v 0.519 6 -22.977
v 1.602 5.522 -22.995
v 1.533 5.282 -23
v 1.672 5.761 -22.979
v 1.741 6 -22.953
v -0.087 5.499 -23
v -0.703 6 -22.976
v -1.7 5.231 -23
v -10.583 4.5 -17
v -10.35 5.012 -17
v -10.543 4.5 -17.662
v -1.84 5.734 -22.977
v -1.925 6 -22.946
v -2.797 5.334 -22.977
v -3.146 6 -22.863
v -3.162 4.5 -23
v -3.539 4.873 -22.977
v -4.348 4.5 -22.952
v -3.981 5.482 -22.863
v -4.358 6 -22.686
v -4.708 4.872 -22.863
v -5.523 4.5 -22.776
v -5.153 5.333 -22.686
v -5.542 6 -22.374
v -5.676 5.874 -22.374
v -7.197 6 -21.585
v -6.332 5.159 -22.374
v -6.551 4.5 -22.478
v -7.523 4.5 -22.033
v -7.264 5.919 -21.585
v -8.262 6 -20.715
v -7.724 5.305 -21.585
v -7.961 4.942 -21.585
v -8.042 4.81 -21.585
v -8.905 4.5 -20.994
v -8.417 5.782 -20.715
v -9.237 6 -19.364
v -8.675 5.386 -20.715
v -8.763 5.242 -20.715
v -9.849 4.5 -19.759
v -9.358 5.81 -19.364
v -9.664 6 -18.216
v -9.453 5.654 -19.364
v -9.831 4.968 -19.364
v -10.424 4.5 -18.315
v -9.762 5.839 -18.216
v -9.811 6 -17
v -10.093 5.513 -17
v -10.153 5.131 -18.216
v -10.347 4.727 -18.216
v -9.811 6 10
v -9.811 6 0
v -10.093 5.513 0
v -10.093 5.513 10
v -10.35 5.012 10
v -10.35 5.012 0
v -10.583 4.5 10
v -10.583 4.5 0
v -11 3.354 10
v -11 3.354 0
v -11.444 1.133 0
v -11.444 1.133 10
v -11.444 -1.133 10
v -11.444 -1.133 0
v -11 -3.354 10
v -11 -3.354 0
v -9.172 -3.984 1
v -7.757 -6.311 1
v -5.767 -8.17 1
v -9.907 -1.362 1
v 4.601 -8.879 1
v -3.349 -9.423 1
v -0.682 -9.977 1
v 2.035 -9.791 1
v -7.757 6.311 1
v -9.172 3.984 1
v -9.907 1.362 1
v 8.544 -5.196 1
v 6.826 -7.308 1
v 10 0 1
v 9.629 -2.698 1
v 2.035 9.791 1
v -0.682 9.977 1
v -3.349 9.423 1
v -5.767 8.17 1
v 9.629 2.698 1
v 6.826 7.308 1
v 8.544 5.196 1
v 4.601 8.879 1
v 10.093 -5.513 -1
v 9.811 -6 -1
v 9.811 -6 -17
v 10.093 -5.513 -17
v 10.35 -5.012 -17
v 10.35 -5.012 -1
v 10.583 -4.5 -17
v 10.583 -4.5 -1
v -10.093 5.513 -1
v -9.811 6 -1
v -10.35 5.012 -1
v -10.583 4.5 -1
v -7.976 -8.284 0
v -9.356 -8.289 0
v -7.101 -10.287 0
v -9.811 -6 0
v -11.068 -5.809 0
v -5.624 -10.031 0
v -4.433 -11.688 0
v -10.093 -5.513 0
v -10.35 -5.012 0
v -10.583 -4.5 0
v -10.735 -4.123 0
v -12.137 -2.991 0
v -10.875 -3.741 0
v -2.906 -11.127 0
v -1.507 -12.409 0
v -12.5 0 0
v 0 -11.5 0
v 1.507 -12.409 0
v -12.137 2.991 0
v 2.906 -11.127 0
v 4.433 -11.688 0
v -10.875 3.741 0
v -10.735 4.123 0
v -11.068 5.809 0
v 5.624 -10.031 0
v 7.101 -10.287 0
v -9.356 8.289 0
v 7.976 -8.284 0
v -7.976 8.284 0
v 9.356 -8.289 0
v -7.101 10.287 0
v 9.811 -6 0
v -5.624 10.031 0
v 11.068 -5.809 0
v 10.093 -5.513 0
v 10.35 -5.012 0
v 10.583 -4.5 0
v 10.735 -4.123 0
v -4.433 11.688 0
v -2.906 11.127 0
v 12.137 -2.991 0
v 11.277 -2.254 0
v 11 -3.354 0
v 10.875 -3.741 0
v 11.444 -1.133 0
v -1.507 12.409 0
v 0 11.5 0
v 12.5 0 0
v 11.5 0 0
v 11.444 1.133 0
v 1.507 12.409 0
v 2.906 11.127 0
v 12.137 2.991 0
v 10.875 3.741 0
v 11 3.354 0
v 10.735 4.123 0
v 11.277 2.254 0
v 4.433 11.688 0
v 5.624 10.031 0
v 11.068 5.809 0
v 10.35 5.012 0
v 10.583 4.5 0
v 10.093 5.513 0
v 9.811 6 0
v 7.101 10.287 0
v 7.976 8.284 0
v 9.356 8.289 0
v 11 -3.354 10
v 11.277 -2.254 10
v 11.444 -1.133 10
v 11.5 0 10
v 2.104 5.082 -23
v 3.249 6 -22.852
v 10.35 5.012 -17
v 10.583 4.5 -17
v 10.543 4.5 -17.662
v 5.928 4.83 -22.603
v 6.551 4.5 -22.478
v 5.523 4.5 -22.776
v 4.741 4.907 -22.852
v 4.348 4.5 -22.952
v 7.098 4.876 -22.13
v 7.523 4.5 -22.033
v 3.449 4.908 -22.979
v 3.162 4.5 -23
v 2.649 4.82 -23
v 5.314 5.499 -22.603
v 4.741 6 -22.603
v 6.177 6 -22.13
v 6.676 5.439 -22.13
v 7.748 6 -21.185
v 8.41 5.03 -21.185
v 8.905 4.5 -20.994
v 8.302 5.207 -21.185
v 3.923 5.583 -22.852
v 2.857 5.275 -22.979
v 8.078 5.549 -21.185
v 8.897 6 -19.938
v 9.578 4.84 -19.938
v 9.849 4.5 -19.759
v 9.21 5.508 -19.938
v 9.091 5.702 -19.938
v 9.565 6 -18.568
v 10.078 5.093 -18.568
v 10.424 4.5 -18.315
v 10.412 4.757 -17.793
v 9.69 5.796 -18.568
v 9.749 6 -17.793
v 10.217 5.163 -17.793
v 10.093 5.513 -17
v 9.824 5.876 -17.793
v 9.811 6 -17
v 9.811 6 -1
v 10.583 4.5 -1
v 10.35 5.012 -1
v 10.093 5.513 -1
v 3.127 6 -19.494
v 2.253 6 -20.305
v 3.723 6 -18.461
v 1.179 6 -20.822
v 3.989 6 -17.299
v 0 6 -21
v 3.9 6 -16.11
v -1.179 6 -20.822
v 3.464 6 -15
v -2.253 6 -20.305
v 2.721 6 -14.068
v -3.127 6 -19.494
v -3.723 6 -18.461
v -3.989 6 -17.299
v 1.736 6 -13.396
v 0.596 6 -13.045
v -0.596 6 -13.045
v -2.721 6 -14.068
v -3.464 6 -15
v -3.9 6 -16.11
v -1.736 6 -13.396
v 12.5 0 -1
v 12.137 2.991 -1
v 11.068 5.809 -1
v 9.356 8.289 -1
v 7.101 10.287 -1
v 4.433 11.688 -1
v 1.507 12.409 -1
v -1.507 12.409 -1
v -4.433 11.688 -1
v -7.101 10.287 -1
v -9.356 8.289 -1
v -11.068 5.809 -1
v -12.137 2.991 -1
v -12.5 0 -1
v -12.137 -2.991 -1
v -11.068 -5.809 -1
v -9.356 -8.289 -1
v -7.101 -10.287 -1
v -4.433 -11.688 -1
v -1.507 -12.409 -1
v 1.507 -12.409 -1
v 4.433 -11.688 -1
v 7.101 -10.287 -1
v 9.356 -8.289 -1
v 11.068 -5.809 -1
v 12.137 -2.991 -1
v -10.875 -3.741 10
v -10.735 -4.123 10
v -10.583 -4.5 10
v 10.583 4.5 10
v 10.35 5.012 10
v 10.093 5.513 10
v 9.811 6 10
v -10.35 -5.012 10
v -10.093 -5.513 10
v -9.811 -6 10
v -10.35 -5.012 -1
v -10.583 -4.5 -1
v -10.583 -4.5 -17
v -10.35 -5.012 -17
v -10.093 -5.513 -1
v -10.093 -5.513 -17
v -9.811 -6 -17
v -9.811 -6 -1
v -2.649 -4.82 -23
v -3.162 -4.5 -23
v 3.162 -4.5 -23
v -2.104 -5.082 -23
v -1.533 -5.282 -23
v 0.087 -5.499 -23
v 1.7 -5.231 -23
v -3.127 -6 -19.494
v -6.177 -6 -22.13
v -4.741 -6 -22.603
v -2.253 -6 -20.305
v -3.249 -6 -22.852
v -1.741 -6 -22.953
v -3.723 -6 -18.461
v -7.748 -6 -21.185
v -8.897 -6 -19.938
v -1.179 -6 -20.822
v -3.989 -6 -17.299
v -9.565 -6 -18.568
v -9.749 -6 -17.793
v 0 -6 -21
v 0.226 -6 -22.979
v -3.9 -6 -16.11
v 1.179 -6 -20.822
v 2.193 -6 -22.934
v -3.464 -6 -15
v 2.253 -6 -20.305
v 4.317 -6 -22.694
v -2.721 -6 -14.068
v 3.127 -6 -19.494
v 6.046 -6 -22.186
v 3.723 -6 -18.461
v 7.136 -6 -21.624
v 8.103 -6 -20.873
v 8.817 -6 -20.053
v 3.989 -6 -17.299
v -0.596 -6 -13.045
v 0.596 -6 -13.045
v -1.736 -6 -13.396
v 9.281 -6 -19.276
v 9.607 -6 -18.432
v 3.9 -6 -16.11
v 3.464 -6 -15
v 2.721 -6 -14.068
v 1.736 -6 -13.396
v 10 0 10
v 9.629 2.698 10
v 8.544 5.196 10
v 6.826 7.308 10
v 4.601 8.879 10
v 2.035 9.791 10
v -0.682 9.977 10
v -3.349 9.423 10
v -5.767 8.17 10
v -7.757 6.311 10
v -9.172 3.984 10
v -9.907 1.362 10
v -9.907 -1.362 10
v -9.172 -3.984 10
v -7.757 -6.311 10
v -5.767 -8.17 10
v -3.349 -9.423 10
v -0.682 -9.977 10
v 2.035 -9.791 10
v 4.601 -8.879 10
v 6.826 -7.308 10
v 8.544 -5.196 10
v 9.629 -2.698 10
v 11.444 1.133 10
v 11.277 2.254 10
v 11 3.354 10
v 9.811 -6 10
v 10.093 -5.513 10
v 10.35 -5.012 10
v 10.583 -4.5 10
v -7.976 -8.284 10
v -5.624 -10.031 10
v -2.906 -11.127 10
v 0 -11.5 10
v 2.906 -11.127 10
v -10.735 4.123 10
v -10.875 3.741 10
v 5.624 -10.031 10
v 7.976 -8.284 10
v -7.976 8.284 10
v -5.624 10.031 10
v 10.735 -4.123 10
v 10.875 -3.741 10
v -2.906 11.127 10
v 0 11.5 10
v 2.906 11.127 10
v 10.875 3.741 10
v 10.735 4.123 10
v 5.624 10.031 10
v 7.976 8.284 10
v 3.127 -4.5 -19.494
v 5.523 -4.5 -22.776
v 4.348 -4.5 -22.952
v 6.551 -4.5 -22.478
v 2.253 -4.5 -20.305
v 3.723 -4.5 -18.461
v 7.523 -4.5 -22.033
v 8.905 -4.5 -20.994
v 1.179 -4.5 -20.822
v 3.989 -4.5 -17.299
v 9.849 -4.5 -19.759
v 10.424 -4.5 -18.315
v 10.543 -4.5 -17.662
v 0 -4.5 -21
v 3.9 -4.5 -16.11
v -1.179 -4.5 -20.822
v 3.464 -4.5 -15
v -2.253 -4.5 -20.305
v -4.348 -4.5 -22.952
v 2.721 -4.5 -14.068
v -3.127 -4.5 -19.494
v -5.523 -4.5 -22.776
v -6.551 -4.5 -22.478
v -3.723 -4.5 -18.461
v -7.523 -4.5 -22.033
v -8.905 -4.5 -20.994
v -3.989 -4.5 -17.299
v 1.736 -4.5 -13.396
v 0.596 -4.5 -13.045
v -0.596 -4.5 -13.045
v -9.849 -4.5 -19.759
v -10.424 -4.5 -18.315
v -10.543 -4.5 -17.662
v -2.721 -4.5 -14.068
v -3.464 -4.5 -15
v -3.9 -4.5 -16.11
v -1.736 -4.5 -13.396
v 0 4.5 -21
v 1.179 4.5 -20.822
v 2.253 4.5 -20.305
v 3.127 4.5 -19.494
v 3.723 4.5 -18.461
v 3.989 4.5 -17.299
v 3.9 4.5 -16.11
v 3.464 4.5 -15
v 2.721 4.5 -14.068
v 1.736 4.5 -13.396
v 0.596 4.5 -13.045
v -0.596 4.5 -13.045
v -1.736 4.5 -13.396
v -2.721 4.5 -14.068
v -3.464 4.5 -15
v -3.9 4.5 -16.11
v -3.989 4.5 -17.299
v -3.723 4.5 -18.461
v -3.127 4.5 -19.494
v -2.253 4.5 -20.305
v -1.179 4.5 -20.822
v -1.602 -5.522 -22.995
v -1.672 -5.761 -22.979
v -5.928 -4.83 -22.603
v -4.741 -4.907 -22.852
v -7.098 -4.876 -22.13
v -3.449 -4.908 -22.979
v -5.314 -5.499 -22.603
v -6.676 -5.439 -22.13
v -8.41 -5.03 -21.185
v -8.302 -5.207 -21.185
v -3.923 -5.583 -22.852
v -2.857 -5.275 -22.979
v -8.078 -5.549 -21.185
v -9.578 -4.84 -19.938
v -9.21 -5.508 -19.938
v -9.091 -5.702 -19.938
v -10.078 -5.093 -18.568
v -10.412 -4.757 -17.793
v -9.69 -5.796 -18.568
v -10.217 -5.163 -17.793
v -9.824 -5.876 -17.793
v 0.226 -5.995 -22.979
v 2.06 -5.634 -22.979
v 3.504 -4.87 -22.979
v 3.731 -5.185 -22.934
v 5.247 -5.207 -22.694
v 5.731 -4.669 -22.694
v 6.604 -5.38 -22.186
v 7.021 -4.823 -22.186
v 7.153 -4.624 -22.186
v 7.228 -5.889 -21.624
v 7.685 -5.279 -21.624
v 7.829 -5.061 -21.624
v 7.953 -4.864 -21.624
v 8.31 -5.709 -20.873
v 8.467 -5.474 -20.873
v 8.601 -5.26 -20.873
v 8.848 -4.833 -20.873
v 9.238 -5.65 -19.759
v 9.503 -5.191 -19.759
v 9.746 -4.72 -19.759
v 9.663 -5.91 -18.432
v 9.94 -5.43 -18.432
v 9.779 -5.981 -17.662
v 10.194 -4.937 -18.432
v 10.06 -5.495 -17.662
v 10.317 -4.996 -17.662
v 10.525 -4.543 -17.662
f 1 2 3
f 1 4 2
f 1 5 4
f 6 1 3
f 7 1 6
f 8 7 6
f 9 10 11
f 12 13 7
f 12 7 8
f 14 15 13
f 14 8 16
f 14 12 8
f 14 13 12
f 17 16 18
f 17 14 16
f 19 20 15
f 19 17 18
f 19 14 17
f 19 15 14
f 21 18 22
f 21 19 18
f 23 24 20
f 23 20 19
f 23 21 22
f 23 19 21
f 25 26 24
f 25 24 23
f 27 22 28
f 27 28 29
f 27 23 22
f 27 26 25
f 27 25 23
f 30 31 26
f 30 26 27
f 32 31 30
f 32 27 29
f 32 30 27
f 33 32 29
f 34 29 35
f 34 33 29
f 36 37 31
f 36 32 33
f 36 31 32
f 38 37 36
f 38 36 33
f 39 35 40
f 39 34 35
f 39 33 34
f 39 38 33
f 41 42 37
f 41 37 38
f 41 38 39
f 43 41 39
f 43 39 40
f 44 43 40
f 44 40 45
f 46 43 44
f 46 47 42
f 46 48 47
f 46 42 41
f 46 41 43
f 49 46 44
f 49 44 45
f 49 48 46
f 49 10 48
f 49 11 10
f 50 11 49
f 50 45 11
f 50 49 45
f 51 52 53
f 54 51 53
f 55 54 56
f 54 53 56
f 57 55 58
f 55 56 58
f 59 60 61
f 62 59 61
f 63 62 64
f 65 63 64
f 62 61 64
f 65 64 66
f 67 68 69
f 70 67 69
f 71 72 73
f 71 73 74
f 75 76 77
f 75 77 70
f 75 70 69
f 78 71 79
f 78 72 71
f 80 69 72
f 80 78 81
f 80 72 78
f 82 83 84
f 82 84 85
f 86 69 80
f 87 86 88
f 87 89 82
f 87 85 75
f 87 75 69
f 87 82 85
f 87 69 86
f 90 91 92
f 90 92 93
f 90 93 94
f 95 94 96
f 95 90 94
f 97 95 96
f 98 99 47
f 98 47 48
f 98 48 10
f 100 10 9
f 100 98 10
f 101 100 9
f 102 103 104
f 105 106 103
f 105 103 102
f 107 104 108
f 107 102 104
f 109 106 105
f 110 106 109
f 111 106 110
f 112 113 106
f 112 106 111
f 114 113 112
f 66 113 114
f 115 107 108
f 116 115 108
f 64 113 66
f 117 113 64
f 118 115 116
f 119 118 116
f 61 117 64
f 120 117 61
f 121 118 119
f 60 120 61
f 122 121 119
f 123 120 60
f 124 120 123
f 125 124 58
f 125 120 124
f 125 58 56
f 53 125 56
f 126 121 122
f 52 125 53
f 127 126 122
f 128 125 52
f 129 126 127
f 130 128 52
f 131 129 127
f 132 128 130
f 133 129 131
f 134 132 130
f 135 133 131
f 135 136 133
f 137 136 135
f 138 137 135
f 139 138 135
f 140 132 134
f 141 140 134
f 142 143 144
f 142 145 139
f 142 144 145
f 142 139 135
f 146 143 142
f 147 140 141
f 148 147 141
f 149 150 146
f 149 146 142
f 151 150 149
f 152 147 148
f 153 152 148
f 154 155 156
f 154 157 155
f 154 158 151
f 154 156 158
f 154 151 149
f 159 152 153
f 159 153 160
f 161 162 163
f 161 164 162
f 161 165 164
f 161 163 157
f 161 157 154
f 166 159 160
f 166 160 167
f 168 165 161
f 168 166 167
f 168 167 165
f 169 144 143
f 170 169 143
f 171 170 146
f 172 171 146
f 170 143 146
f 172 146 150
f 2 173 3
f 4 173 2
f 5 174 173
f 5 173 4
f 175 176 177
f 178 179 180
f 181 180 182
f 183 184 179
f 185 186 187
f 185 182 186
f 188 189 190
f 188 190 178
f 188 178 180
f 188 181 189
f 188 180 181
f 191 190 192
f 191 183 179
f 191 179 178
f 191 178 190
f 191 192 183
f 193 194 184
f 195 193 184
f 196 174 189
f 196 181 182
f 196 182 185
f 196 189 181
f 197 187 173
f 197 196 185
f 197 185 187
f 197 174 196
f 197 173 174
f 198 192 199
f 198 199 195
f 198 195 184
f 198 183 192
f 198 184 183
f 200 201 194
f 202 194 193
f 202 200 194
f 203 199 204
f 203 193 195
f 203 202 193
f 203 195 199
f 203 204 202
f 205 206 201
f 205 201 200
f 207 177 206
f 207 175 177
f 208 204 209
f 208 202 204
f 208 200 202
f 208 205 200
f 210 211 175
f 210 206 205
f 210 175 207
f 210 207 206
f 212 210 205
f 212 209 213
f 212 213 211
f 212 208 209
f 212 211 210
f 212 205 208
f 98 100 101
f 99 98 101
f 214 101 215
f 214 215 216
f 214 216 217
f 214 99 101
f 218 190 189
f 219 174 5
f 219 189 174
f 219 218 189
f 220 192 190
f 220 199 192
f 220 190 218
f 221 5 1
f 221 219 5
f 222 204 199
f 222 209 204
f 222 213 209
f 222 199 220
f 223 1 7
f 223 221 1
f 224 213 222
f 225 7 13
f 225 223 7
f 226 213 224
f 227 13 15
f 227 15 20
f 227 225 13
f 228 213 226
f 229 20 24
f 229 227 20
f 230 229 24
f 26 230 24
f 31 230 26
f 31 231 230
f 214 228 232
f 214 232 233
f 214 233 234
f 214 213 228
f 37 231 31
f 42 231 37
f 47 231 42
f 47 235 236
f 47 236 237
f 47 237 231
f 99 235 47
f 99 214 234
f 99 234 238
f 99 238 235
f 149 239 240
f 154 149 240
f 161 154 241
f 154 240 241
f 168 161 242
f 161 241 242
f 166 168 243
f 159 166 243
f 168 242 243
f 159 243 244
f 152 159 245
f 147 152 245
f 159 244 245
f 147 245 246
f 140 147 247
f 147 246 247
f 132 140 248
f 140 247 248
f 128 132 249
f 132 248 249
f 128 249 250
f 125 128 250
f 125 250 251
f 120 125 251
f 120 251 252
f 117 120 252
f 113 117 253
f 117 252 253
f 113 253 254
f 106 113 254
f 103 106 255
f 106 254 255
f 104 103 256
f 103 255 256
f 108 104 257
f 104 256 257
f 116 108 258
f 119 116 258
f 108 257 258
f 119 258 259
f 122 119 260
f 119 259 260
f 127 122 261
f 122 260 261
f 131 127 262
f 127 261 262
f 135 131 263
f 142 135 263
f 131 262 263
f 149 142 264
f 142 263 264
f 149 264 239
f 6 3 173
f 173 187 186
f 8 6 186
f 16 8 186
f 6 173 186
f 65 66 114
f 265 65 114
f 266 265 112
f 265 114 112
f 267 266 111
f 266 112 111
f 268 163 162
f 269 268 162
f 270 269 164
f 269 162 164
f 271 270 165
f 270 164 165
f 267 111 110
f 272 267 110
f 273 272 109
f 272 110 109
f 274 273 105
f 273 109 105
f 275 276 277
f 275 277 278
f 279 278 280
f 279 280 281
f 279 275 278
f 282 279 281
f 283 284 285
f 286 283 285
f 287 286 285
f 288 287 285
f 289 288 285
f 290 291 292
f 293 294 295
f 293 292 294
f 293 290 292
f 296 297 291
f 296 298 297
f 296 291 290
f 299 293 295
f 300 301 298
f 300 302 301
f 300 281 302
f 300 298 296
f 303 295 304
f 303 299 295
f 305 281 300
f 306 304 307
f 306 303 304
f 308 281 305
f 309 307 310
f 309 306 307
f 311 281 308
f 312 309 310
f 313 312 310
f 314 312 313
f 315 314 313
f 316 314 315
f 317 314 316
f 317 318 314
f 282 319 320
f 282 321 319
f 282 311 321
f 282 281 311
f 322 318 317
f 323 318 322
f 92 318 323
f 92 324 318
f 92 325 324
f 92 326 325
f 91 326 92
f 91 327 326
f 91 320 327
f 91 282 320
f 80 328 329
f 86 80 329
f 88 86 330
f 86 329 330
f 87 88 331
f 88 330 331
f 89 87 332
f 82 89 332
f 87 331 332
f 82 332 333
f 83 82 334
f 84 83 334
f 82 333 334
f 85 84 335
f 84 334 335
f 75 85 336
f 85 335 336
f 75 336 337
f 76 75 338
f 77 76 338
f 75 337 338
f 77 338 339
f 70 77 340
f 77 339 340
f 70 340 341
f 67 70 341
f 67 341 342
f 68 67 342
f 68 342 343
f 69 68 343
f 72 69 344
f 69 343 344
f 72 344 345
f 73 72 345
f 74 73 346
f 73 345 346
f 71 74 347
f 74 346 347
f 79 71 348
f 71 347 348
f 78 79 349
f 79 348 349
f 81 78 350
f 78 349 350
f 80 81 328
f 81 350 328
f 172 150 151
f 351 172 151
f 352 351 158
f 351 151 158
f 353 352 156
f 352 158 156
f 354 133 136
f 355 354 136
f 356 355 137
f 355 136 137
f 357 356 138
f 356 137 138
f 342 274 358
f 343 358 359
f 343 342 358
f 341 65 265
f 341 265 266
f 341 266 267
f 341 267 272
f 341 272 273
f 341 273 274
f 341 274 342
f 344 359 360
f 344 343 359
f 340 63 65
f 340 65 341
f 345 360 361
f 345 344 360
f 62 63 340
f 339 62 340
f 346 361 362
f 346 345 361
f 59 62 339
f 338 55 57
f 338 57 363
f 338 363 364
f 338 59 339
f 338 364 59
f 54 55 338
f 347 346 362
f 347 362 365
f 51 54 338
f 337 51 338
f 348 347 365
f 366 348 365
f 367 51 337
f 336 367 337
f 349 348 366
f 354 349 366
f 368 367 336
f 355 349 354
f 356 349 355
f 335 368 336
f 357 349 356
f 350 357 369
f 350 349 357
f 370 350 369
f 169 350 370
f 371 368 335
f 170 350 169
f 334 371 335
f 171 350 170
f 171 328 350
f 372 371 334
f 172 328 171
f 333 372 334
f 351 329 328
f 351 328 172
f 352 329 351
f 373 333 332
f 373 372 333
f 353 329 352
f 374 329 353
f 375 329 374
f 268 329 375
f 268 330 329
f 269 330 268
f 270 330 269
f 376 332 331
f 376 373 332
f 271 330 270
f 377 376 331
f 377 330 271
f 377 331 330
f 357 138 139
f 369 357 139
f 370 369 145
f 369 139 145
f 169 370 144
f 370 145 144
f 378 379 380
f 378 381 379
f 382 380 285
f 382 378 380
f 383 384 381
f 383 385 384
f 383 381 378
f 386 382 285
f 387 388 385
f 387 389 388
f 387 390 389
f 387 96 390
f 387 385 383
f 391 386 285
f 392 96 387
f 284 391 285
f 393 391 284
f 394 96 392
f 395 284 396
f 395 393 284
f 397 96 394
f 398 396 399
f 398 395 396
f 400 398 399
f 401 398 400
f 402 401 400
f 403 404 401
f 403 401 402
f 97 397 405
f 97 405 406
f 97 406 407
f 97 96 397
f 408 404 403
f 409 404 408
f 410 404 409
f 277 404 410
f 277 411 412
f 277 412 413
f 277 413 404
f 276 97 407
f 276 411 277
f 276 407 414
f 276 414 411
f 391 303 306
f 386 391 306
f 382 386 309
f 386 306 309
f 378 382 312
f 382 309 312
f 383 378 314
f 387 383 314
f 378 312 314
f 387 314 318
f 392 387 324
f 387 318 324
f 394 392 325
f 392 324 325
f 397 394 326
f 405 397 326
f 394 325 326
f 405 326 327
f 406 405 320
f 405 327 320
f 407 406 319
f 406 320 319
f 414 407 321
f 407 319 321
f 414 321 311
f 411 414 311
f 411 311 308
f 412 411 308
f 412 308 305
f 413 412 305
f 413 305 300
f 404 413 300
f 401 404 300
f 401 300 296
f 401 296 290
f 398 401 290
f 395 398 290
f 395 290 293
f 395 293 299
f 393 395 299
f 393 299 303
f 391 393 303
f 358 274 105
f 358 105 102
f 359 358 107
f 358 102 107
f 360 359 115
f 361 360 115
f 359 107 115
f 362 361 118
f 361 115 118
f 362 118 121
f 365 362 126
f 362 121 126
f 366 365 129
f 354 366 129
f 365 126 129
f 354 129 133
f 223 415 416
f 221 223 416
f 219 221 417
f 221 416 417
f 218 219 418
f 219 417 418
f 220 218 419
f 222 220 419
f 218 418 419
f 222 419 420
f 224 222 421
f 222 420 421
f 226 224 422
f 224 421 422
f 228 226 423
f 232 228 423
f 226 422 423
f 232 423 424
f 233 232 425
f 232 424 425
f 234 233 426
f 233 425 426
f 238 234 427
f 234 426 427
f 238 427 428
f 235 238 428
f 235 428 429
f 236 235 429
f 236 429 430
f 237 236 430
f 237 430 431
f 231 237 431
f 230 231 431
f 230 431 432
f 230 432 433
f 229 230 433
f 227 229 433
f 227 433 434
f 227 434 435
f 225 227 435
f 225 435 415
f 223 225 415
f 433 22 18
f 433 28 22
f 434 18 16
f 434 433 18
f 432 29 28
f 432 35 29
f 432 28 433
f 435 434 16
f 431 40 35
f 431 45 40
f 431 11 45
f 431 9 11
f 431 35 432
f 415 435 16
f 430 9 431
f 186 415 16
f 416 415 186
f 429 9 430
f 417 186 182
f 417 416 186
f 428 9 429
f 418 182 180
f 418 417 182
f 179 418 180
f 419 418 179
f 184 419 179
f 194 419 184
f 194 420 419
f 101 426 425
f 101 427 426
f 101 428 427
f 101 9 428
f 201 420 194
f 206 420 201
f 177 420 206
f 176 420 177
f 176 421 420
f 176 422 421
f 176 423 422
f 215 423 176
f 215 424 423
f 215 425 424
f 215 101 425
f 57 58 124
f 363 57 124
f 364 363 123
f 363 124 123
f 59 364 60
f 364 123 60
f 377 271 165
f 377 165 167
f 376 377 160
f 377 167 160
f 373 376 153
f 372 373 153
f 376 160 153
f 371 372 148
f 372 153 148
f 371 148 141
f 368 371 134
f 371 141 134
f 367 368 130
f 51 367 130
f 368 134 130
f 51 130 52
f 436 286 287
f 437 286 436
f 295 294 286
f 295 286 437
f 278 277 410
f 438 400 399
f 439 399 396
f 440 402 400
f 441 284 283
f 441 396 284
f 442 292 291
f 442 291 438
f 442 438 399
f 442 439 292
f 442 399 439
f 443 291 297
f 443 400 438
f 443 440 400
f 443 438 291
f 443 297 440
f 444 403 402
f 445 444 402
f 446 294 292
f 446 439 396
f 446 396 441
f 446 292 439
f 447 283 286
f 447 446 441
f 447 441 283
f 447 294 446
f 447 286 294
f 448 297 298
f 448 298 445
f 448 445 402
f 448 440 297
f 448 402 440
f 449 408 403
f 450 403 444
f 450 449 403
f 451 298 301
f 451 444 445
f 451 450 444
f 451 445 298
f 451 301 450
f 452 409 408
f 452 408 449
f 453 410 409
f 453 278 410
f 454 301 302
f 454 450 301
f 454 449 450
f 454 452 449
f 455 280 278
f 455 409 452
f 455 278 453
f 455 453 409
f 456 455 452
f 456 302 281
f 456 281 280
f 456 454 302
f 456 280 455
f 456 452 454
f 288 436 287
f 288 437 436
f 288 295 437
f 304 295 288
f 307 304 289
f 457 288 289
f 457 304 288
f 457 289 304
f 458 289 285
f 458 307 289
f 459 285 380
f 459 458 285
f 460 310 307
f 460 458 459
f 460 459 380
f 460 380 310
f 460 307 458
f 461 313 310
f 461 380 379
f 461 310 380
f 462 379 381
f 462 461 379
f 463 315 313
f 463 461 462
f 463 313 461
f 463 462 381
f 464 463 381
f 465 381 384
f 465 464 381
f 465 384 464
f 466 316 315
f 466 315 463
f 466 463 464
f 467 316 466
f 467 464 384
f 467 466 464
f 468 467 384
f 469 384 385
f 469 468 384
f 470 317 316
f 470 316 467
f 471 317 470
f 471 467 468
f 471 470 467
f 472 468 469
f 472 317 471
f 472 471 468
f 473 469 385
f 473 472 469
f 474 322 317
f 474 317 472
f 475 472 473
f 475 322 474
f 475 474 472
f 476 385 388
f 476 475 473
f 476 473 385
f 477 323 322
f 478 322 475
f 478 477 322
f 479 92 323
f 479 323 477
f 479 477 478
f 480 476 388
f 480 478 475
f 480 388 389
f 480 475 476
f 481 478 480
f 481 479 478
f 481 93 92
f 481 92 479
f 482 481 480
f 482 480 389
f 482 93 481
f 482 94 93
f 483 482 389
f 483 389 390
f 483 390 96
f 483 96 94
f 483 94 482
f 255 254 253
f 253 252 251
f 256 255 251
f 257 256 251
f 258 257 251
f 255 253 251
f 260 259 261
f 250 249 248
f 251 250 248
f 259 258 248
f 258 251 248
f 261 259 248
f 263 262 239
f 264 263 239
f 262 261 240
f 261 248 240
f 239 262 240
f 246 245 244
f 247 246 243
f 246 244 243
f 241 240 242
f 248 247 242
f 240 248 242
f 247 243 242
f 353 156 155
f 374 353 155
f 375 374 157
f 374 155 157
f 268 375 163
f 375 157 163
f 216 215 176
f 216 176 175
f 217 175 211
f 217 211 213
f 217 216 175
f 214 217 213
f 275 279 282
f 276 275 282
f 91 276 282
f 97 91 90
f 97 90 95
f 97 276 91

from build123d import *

# Parameters (mm, degrees)
BOSS_EXTRUDE1_DEPTH   = 10
BOSS_EXTRUDE2_START   = -1
SKETCH1_3_R           = 12.5
BOSS_EXTRUDE2_DEPTH   = 1
BOSS_EXTRUDE3_START   = -1
BOSS_EXTRUDE3_DEPTH   = 22
BOSS_EXTRUDE3_2_DEPTH = 22
SKETCH2_R             = 4
CUT_EXTRUDE1_DEPTH    = 33.05464085
FILLET1_R             = 6
FILLET4_R             = 6
SKETCH3_R             = 10
CUT_EXTRUDE2_DEPTH    = 9


with BuildPart() as part:
    # Sketch1 → Boss-Extrude1 (new body)
    with BuildSketch(Plane.XY):
        with BuildLine():
            ThreePointArc((9.810708435, 6), (0, 11.5), (-9.810708435, 6))
            Line((-9.810708435, 6), (9.810708435, 6))
        make_face()
        with BuildLine():
            Line((9.810708435, 6), (-9.810708435, 6))
            ThreePointArc((-9.810708435, 6), (-10.224401665, 5.264181854), (-10.583005244, 4.5))
            Line((-10.583005244, 4.5), (10.583005244, 4.5))
            ThreePointArc((10.583005244, 4.5), (10.224401665, 5.264181854), (9.810708435, 6))
        make_face()
        with BuildLine():
            Line((10.583005244, 4.5), (-10.583005244, 4.5))
            ThreePointArc((-10.583005244, 4.5), (-10.806701598, 3.932581923), (-11, 3.354101966))
            Line((-11, 3.354101966), (-11, -3.354101966))
            ThreePointArc((-11, -3.354101966), (-10.806701598, -3.932581923), (-10.583005244, -4.5))
            Line((-10.583005244, -4.5), (10.583005244, -4.5))
            ThreePointArc((10.583005244, -4.5), (10.806701598, -3.932581923), (11, -3.354101966))
            Line((11, -3.354101966), (11, 3.354101966))
            ThreePointArc((11, 3.354101966), (10.806701598, 3.932581923), (10.583005244, 4.5))
        make_face()
        with BuildLine():
            ThreePointArc((11.5, 0), (11.374313166, 1.695582496), (11, 3.354101966))
            Line((11, 3.354101966), (11, -3.354101966))
            ThreePointArc((11, -3.354101966), (11.374313166, -1.695582496), (11.5, 0))
        make_face()
        with BuildLine():
            Line((9.810708435, -6), (-9.810708435, -6))
            ThreePointArc((-9.810708435, -6), (0, -11.5), (9.810708435, -6))
        make_face()
        with BuildLine():
            Line((10.583005244, -4.5), (-10.583005244, -4.5))
            ThreePointArc((-10.583005244, -4.5), (-10.224401665, -5.264181854), (-9.810708435, -6))
            Line((-9.810708435, -6), (9.810708435, -6))
            ThreePointArc((9.810708435, -6), (10.224401665, -5.264181854), (10.583005244, -4.5))
        make_face()
        with BuildLine():
            Line((-11, -3.354101966), (-11, 3.354101966))
            ThreePointArc((-11, 3.354101966), (-11.5, 0), (-11, -3.354101966))
        make_face()
    extrude(amount=BOSS_EXTRUDE1_DEPTH)

    # Sketch1<3> → Boss-Extrude2 (add)
    # profile 1 of 8: a face of its own
    with BuildSketch(Plane.XY.offset(BOSS_EXTRUDE2_START)):
        Circle(SKETCH1_3_R)
        with BuildLine():
            ThreePointArc((-10.583005244, 4.5), (-10.224401665, 5.264181854), (-9.810708435, 6))
            ThreePointArc((-9.810708435, 6), (0, 11.5), (9.810708435, 6))
            ThreePointArc((9.810708435, 6), (10.224401665, 5.264181854), (10.583005244, 4.5))
            ThreePointArc((10.583005244, 4.5), (10.806701598, 3.932581923), (11, 3.354101966))
            ThreePointArc((11, 3.354101966), (11.374313166, 1.695582496), (11.5, 0))
            ThreePointArc((11.5, 0), (11.374313166, -1.695582496), (11, -3.354101966))
            ThreePointArc((11, -3.354101966), (10.806701598, -3.932581923), (10.583005244, -4.5))
            ThreePointArc((10.583005244, -4.5), (10.224401665, -5.264181854), (9.810708435, -6))
            ThreePointArc((9.810708435, -6), (0, -11.5), (-9.810708435, -6))
            ThreePointArc((-9.810708435, -6), (-10.224401665, -5.264181854), (-10.583005244, -4.5))
            ThreePointArc((-10.583005244, -4.5), (-10.806701598, -3.932581923), (-11, -3.354101966))
            ThreePointArc((-11, -3.354101966), (-11.5, 0), (-11, 3.354101966))
            ThreePointArc((-11, 3.354101966), (-10.806701598, 3.932581923), (-10.583005244, 4.5))
        make_face(mode=Mode.SUBTRACT)
    # profile 2 of 8: a face of its own
    with BuildSketch(Plane.XY.offset(BOSS_EXTRUDE2_START)):
        with BuildLine():
            Line((-11, -3.354101966), (-11, 3.354101966))
            ThreePointArc((-11, 3.354101966), (-11.5, 0), (-11, -3.354101966))
        make_face()
    # profile 3 of 8: a face of its own
    with BuildSketch(Plane.XY.offset(BOSS_EXTRUDE2_START)):
        with BuildLine():
            ThreePointArc((9.810708435, 6), (0, 11.5), (-9.810708435, 6))
            Line((-9.810708435, 6), (9.810708435, 6))
        make_face()
    # profile 4 of 8: a face of its own
    with BuildSketch(Plane.XY.offset(BOSS_EXTRUDE2_START)):
        with BuildLine():
            Line((9.810708435, 6), (-9.810708435, 6))
            ThreePointArc((-9.810708435, 6), (-10.224401665, 5.264181854), (-10.583005244, 4.5))
            Line((-10.583005244, 4.5), (10.583005244, 4.5))
            ThreePointArc((10.583005244, 4.5), (10.224401665, 5.264181854), (9.810708435, 6))
        make_face()
    # profile 5 of 8: a face of its own
    with BuildSketch(Plane.XY.offset(BOSS_EXTRUDE2_START)):
        with BuildLine():
            ThreePointArc((11.5, 0), (11.374313166, 1.695582496), (11, 3.354101966))
            Line((11, 3.354101966), (11, -3.354101966))
            ThreePointArc((11, -3.354101966), (11.374313166, -1.695582496), (11.5, 0))
        make_face()
    # profile 6 of 8: a face of its own
    with BuildSketch(Plane.XY.offset(BOSS_EXTRUDE2_START)):
        with BuildLine():
            Line((10.583005244, 4.5), (-10.583005244, 4.5))
            ThreePointArc((-10.583005244, 4.5), (-10.806701598, 3.932581923), (-11, 3.354101966))
            Line((-11, 3.354101966), (-11, -3.354101966))
            ThreePointArc((-11, -3.354101966), (-10.806701598, -3.932581923), (-10.583005244, -4.5))
            Line((-10.583005244, -4.5), (10.583005244, -4.5))
            ThreePointArc((10.583005244, -4.5), (10.806701598, -3.932581923), (11, -3.354101966))
            Line((11, -3.354101966), (11, 3.354101966))
            ThreePointArc((11, 3.354101966), (10.806701598, 3.932581923), (10.583005244, 4.5))
        make_face()
    # profile 7 of 8: a face of its own
    with BuildSketch(Plane.XY.offset(BOSS_EXTRUDE2_START)):
        with BuildLine():
            Line((10.583005244, -4.5), (-10.583005244, -4.5))
            ThreePointArc((-10.583005244, -4.5), (-10.224401665, -5.264181854), (-9.810708435, -6))
            Line((-9.810708435, -6), (9.810708435, -6))
            ThreePointArc((9.810708435, -6), (10.224401665, -5.264181854), (10.583005244, -4.5))
        make_face()
    # profile 8 of 8: a face of its own
    with BuildSketch(Plane.XY.offset(BOSS_EXTRUDE2_START)):
        with BuildLine():
            Line((9.810708435, -6), (-9.810708435, -6))
            ThreePointArc((-9.810708435, -6), (0, -11.5), (9.810708435, -6))
        make_face()
    extrude(amount=BOSS_EXTRUDE2_DEPTH)

    # Sketch3 → Cut-Extrude2 (cut)
    with BuildSketch(Plane.XY.offset(10)):
        Circle(SKETCH3_R)
    extrude(amount=-CUT_EXTRUDE2_DEPTH, mode=Mode.SUBTRACT)


with BuildPart() as body_2:
    # Sketch1<5> → Boss-Extrude3 (new body)
    with BuildSketch(Plane.XY.offset(BOSS_EXTRUDE3_START)):
        with BuildLine():
            Line((9.810708435, 6), (-9.810708435, 6))
            ThreePointArc((-9.810708435, 6), (-10.224401665, 5.264181854), (-10.583005244, 4.5))
            Line((-10.583005244, 4.5), (10.583005244, 4.5))
            ThreePointArc((10.583005244, 4.5), (10.224401665, 5.264181854), (9.810708435, 6))
        make_face()
    extrude(amount=-BOSS_EXTRUDE3_DEPTH)


with BuildPart() as body_3:
    # Sketch1<5> → Boss-Extrude3 2 (new body)
    with BuildSketch(Plane.XY.offset(BOSS_EXTRUDE3_START)):
        with BuildLine():
            Line((10.583005244, -4.5), (-10.583005244, -4.5))
            ThreePointArc((-10.583005244, -4.5), (-10.224401665, -5.264181854), (-9.810708435, -6))
            Line((-9.810708435, -6), (9.810708435, -6))
            ThreePointArc((9.810708435, -6), (10.224401665, -5.264181854), (10.583005244, -4.5))
        make_face()
    extrude(amount=-BOSS_EXTRUDE3_2_DEPTH)


with BuildPart() as cut_extrude1_tool:
    # Sketch2 → Cut-Extrude1 (new, through all)
    with BuildSketch(Plane.XZ.offset(6)):
        with Locations(Location((0, -17, 0), (0, 0, 270))):
            Circle(SKETCH2_R)
    extrude(amount=-CUT_EXTRUDE1_DEPTH)


with BuildPart() as body_2_1:
    add(body_2.part)

    # Cut-Extrude1: cut by cut_extrude1_tool
    add(cut_extrude1_tool.part, mode=Mode.SUBTRACT)

    # Fillet4
    # the kernel refuses this fillet: 6 mm, written as the material it takes off along each edge
    with BuildSketch(Plane(origin=(0, 0, -23), x_dir=(0.2787039750131438, 0.9603770584056415, 0), z_dir=(0.9603770584056415, -0.2787039750131438, 0))) as fillet4_piece_1:
        with BuildLine():
            CenterArc((11.5 - FILLET4_R, FILLET4_R), FILLET4_R, 270, 90)
            Line((11.5 - FILLET4_R, 0), (11.5, 0))
            Line((11.5, 0), (11.5, FILLET4_R))
        make_face()
    revolve(axis=Axis((0, 0, -23), (0, 0, 1)), revolution_arc=157.881072733, mode=Mode.SUBTRACT)
    with BuildSketch(Plane(origin=(0, 0, -23), x_dir=(0.6198036364033519, -0.7847569383581018, 0), z_dir=(-0.7847569383581018, -0.6198036364033519, 0))) as fillet4_piece_2:
        with BuildLine():
            CenterArc((11.5 - FILLET4_R, FILLET4_R), FILLET4_R, 270, 90)
            Line((11.5, FILLET4_R), (11.5, 0))
            Line((11.5, 0), (11.5 - FILLET4_R, 0))
        make_face()
    revolve(axis=Axis((0, 0, -23), (0, 0, 1)), revolution_arc=157.881072733, mode=Mode.SUBTRACT)


with BuildPart() as body_3_1:
    add(body_3.part)

    # Cut-Extrude1: cut by cut_extrude1_tool
    add(cut_extrude1_tool.part, mode=Mode.SUBTRACT)

    # Fillet1
    # the kernel refuses this fillet: 6 mm, written as the material it takes off along each edge
    with BuildSketch(Plane(origin=(0, 0, -23), x_dir=(-0.27870397501325017, -0.9603770584056106, 0), z_dir=(-0.9603770584056106, 0.27870397501325017, 0))) as fillet1_piece_1:
        with BuildLine():
            CenterArc((11.5 - FILLET1_R, FILLET1_R), FILLET1_R, 270, 90)
            Line((11.5 - FILLET1_R, 0), (11.5, 0))
            Line((11.5, 0), (11.5, FILLET1_R))
        make_face()
    revolve(axis=Axis((0, 0, -23), (0, 0, 1)), revolution_arc=157.881072733, mode=Mode.SUBTRACT)
    with BuildSketch(Plane(origin=(0, 0, -23), x_dir=(-0.6198036364032732, 0.784756938358164, 0), z_dir=(0.784756938358164, 0.6198036364032732, 0))) as fillet1_piece_2:
        with BuildLine():
            CenterArc((11.5 - FILLET1_R, FILLET1_R), FILLET1_R, 270, 90)
            Line((11.5, FILLET1_R), (11.5, 0))
            Line((11.5, 0), (11.5 - FILLET1_R, 0))
        make_face()
    revolve(axis=Axis((0, 0, -23), (0, 0, 1)), revolution_arc=157.881072733, mode=Mode.SUBTRACT)


solid = Compound([part.part, body_2_1.part, body_3_1.part])
